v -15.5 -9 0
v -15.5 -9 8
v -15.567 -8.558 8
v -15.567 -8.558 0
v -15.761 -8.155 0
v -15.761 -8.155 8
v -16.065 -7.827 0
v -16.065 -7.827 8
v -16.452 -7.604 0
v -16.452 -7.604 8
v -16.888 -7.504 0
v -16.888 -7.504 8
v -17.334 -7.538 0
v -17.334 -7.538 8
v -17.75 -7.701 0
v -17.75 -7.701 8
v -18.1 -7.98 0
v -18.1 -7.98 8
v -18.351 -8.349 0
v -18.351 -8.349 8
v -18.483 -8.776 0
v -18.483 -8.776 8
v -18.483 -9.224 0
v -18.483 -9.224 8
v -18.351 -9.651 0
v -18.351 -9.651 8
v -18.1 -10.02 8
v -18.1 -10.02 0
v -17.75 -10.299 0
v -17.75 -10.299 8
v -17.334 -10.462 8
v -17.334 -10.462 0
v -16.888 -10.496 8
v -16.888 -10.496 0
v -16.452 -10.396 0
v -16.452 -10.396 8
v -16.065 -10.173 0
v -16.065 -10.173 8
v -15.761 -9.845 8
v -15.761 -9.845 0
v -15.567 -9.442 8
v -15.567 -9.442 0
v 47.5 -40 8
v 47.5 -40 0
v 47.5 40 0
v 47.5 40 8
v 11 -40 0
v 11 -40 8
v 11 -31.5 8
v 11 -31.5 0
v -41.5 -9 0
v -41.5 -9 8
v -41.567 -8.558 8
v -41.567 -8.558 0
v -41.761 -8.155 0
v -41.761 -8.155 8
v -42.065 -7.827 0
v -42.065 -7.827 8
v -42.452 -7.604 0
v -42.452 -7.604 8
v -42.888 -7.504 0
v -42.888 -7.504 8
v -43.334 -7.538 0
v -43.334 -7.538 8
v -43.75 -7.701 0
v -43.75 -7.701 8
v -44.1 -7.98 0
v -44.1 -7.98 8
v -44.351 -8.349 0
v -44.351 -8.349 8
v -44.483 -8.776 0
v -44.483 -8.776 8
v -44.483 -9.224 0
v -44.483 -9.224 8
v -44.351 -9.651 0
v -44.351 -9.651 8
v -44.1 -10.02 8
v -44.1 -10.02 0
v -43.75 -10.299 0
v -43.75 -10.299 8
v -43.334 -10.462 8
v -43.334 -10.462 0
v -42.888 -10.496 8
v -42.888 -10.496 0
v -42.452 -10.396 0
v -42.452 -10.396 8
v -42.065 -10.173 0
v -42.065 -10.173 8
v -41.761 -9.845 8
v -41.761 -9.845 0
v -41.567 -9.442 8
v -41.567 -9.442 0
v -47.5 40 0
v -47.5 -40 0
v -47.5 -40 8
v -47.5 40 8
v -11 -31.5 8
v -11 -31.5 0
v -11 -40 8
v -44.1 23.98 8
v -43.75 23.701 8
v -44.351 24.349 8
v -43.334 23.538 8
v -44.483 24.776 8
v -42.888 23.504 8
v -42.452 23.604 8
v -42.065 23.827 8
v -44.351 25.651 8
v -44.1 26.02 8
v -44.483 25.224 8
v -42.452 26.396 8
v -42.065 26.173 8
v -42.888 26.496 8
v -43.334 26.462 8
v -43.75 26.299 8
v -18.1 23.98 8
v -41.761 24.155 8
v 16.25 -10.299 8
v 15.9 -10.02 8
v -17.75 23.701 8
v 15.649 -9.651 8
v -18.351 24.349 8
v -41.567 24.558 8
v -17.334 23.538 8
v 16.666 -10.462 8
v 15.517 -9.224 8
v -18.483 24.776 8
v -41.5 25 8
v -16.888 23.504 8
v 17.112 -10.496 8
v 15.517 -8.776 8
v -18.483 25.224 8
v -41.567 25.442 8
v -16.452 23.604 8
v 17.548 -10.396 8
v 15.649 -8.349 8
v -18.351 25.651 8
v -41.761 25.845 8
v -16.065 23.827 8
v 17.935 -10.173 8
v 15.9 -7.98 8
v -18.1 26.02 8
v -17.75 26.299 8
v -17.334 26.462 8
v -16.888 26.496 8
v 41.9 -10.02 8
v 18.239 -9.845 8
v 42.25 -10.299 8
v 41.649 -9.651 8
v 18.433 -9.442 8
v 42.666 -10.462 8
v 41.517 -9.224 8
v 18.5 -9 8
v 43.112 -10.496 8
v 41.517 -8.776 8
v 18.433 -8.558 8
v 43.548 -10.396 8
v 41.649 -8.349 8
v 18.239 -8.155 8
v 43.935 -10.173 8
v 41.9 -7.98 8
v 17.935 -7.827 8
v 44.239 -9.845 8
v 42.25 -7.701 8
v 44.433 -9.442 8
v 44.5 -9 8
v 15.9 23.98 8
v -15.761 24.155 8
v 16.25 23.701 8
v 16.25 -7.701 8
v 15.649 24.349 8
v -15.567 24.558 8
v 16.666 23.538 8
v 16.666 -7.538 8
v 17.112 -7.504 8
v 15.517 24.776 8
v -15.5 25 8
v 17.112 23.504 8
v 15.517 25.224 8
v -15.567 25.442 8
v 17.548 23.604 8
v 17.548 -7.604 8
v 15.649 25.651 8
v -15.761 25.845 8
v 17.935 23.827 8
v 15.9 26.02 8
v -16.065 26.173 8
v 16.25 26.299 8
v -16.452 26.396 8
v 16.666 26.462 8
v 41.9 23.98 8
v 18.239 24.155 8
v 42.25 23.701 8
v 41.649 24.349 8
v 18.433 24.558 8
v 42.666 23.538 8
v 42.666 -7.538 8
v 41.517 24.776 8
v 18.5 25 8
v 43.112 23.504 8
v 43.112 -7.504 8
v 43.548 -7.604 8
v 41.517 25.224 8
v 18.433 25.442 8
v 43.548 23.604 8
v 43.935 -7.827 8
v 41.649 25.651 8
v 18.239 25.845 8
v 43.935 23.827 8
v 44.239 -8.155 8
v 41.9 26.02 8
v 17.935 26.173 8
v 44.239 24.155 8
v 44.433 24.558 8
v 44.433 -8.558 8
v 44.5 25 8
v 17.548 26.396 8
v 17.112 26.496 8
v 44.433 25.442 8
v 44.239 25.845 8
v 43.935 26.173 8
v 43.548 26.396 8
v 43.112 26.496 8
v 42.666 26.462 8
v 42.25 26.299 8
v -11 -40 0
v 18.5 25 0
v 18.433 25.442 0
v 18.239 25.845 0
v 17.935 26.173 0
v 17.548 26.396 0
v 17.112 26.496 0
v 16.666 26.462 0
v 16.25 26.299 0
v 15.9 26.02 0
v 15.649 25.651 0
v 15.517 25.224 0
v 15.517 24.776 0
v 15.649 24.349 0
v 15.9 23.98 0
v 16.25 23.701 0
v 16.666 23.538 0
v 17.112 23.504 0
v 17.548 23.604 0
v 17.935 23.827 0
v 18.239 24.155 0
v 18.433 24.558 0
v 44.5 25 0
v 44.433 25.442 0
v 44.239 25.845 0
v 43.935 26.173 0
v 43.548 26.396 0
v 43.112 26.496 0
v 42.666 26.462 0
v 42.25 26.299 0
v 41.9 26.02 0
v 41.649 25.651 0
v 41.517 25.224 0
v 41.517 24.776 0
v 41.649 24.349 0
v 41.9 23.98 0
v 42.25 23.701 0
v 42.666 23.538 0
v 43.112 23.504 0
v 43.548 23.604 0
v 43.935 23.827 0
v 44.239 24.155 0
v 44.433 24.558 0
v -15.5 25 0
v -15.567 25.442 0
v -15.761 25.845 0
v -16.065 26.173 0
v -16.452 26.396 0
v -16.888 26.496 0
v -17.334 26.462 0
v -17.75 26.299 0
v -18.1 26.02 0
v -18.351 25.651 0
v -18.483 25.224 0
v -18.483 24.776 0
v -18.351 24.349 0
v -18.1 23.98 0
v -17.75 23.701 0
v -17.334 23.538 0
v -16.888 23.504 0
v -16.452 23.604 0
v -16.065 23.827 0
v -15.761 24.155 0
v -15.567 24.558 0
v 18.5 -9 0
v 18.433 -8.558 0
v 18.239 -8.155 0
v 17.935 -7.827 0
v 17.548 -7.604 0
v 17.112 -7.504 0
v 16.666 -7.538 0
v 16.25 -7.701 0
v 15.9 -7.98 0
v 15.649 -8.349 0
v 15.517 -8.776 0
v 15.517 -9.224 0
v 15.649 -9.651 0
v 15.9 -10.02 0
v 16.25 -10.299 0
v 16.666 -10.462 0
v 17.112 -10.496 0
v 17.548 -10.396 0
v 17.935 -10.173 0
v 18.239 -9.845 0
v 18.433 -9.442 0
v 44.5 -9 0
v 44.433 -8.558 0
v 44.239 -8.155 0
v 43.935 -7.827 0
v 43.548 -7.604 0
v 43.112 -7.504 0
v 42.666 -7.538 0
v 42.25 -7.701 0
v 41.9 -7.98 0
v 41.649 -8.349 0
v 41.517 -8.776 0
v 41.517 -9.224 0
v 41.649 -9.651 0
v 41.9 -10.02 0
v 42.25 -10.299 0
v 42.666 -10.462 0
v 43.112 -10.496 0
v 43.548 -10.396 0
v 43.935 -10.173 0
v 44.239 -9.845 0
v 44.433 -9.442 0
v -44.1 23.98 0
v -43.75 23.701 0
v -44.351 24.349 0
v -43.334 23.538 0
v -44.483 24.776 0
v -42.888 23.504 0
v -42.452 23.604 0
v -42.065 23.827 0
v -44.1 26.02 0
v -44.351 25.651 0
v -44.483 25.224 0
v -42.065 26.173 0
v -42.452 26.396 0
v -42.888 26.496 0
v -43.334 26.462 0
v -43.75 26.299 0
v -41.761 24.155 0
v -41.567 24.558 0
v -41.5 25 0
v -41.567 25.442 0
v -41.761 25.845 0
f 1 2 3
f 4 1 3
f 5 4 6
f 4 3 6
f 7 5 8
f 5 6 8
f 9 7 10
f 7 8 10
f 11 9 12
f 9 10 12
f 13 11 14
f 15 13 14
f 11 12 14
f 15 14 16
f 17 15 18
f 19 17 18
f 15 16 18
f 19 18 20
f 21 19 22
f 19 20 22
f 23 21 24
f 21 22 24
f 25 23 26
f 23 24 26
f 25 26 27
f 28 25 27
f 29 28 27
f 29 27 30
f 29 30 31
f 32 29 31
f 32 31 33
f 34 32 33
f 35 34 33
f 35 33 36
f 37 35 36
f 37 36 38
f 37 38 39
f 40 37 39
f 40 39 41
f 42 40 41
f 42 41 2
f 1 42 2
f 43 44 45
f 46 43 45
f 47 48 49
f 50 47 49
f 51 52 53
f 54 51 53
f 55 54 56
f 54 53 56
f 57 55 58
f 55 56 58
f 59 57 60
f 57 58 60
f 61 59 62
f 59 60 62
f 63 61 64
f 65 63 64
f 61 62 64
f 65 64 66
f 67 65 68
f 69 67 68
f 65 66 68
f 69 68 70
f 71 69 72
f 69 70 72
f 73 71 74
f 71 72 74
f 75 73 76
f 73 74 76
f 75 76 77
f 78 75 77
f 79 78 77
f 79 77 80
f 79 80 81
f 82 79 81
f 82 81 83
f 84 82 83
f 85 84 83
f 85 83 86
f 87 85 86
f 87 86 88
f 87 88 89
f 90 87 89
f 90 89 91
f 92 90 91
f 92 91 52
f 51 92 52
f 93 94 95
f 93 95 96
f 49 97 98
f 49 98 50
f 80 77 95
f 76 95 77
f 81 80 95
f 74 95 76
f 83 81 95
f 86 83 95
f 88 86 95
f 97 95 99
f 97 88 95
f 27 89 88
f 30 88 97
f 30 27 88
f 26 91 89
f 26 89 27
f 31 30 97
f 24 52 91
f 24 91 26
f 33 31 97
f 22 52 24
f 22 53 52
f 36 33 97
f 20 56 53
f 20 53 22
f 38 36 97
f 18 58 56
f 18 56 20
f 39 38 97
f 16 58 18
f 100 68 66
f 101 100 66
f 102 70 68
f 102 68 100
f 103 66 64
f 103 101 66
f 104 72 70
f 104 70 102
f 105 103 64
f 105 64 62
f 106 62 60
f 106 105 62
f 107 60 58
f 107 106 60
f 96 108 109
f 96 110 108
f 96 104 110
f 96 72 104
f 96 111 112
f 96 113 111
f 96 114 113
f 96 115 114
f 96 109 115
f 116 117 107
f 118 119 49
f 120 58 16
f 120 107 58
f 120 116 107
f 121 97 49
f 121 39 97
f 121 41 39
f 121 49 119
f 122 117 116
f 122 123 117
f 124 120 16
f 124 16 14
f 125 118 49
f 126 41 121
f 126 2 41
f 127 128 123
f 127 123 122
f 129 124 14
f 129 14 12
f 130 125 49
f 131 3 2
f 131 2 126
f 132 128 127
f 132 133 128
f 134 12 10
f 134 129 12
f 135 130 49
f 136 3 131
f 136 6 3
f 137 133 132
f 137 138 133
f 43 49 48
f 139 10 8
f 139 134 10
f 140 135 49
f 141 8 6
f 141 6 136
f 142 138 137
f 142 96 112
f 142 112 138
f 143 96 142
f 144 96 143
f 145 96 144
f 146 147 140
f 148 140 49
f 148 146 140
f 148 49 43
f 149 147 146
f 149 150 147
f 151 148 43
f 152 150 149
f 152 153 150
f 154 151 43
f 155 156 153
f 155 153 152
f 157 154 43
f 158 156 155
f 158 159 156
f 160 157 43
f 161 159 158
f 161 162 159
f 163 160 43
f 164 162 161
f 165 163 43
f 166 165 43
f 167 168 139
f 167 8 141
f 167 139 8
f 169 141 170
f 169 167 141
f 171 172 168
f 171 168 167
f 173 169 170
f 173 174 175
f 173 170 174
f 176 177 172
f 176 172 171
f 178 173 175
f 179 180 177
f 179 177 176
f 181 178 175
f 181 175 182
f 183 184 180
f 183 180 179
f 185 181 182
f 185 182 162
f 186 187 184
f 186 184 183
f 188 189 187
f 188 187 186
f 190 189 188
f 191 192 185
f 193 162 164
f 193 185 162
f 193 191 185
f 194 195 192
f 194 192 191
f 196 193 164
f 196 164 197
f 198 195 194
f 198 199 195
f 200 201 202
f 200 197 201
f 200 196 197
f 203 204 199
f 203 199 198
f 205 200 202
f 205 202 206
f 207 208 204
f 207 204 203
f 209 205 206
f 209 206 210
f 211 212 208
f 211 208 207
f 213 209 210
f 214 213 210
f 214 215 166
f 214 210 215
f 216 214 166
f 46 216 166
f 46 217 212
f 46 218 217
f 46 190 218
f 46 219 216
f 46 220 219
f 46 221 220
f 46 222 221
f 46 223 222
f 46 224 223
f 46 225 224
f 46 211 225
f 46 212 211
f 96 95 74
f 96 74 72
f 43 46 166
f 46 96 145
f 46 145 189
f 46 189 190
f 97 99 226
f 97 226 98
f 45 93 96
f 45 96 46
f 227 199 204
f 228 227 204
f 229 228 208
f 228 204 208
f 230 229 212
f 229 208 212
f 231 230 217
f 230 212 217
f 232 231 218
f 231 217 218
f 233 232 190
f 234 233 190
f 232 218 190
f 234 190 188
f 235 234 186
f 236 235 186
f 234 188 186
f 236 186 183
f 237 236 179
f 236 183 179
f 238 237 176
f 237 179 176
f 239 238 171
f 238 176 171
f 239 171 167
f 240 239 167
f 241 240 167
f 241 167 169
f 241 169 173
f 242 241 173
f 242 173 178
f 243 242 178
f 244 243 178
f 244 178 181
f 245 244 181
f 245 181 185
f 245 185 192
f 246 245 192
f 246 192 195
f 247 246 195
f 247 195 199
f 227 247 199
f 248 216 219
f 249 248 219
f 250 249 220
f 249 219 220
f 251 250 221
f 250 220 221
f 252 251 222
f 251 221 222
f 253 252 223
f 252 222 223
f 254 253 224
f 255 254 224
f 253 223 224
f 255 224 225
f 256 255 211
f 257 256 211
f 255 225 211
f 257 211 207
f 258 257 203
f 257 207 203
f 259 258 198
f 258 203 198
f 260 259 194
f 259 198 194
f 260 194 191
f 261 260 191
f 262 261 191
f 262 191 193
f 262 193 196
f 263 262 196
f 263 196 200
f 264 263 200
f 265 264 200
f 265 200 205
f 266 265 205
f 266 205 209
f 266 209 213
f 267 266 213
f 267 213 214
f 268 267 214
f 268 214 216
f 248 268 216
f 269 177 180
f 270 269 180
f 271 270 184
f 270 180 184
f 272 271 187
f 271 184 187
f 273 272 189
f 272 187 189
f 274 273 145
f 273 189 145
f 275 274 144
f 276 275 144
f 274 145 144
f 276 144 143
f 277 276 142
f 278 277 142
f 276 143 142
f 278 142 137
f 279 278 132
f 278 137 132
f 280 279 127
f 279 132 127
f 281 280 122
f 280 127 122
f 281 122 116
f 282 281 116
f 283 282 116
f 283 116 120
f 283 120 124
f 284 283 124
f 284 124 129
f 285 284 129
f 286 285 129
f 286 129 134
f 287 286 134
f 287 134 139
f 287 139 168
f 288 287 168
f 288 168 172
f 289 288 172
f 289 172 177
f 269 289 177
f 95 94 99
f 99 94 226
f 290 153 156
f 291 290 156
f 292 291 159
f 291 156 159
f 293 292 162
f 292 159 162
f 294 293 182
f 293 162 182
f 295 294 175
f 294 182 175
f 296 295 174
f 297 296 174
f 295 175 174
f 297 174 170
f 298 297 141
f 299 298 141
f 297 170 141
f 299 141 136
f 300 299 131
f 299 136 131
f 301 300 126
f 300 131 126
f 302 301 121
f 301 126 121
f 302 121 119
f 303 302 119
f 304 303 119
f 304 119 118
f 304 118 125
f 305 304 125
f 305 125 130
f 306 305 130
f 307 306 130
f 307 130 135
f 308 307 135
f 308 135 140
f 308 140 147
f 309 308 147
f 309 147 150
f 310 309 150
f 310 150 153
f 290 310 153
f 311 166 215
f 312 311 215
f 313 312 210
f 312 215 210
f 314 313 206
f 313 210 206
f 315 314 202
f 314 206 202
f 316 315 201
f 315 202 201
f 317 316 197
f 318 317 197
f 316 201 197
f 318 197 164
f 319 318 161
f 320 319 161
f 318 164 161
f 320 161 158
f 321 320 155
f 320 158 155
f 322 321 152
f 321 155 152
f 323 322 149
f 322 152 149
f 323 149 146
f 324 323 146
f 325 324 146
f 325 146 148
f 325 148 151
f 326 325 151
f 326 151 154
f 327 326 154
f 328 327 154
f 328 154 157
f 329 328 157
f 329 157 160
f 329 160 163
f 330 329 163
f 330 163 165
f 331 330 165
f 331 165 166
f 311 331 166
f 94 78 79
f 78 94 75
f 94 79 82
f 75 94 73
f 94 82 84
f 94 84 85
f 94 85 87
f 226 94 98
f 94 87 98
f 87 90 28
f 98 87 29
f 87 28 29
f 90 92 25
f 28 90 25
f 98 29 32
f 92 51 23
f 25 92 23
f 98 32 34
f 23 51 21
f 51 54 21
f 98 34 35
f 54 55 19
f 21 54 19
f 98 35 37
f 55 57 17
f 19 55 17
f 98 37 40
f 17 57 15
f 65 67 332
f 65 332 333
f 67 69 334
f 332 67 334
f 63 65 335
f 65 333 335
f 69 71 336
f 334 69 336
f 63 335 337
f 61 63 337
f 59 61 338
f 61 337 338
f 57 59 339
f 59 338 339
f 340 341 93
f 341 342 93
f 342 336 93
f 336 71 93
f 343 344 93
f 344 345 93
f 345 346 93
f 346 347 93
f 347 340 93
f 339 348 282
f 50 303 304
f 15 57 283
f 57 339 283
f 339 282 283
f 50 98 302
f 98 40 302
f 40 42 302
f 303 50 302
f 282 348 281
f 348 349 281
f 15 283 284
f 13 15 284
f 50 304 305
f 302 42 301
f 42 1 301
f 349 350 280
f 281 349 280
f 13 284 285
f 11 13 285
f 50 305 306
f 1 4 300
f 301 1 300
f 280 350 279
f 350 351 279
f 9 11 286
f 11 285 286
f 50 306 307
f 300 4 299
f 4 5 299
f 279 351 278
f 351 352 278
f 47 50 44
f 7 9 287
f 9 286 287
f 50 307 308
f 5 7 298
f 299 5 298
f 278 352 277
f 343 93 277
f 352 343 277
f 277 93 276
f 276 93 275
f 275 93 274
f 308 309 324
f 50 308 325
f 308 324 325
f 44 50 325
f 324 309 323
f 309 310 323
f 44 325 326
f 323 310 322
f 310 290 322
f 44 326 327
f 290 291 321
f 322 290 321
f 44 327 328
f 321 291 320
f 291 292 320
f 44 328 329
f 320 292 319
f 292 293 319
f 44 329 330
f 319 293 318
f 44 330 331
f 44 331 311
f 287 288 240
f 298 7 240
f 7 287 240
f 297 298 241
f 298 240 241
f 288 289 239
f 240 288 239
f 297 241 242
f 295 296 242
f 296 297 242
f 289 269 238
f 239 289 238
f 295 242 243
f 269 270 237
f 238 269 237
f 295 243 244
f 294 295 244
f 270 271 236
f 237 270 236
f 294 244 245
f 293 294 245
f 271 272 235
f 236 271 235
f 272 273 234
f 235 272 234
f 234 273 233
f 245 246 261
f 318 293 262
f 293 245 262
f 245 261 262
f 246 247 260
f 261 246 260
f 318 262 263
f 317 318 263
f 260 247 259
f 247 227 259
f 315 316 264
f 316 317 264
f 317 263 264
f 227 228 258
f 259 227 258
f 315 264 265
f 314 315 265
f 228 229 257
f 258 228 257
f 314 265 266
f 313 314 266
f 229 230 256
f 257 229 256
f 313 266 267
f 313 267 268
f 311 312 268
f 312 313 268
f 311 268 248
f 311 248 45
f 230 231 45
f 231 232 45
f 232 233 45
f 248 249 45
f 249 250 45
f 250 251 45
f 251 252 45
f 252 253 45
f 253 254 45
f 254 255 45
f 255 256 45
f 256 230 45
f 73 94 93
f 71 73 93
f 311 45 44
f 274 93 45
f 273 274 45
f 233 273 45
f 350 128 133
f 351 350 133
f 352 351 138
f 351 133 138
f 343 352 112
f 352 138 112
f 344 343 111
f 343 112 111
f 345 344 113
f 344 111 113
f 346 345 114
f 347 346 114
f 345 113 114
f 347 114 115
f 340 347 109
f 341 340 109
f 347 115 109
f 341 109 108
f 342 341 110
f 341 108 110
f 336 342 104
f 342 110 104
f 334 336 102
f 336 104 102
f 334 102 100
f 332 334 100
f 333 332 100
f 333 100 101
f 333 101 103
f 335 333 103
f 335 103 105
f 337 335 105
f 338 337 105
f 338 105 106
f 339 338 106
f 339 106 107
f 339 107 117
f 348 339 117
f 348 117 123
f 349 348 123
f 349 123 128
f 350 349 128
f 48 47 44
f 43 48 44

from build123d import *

# Parameters (mm, degrees)
SKETCH_W     = 95
SKETCH_H     = 80
PAD_DEPTH    = 8
SKETCH001_R  = 1.5
SKETCH001_W  = 22
SKETCH001_H  = 8.5
POCKET_DEPTH = 8.001


with BuildPart() as part:
    # Sketch → Pad (new body)
    with BuildSketch(Plane.XY):
        Rectangle(SKETCH_W, SKETCH_H)
    extrude(amount=PAD_DEPTH)

    # Sketch001 (on Face6 of Pad) → Pocket (cut, through all)
    with BuildSketch(Plane.XY.offset(8)):
        with Locations((-43, 25)):
            Circle(SKETCH001_R)
        with Locations((-17, 25)):
            Circle(SKETCH001_R)
        with Locations((-17, -9)):
            Circle(SKETCH001_R)
        with Locations((-43, -9)):
            Circle(SKETCH001_R)
        with Locations((17, 25)):
            Circle(SKETCH001_R)
        with Locations((43, 25)):
            Circle(SKETCH001_R)
        with Locations((43, -9)):
            Circle(SKETCH001_R)
        with Locations((17, -9)):
            Circle(SKETCH001_R)
        with Locations((0, -35.75)):
            Rectangle(SKETCH001_W, SKETCH001_H)
    extrude(amount=-POCKET_DEPTH, mode=Mode.SUBTRACT)


solid = part.part
